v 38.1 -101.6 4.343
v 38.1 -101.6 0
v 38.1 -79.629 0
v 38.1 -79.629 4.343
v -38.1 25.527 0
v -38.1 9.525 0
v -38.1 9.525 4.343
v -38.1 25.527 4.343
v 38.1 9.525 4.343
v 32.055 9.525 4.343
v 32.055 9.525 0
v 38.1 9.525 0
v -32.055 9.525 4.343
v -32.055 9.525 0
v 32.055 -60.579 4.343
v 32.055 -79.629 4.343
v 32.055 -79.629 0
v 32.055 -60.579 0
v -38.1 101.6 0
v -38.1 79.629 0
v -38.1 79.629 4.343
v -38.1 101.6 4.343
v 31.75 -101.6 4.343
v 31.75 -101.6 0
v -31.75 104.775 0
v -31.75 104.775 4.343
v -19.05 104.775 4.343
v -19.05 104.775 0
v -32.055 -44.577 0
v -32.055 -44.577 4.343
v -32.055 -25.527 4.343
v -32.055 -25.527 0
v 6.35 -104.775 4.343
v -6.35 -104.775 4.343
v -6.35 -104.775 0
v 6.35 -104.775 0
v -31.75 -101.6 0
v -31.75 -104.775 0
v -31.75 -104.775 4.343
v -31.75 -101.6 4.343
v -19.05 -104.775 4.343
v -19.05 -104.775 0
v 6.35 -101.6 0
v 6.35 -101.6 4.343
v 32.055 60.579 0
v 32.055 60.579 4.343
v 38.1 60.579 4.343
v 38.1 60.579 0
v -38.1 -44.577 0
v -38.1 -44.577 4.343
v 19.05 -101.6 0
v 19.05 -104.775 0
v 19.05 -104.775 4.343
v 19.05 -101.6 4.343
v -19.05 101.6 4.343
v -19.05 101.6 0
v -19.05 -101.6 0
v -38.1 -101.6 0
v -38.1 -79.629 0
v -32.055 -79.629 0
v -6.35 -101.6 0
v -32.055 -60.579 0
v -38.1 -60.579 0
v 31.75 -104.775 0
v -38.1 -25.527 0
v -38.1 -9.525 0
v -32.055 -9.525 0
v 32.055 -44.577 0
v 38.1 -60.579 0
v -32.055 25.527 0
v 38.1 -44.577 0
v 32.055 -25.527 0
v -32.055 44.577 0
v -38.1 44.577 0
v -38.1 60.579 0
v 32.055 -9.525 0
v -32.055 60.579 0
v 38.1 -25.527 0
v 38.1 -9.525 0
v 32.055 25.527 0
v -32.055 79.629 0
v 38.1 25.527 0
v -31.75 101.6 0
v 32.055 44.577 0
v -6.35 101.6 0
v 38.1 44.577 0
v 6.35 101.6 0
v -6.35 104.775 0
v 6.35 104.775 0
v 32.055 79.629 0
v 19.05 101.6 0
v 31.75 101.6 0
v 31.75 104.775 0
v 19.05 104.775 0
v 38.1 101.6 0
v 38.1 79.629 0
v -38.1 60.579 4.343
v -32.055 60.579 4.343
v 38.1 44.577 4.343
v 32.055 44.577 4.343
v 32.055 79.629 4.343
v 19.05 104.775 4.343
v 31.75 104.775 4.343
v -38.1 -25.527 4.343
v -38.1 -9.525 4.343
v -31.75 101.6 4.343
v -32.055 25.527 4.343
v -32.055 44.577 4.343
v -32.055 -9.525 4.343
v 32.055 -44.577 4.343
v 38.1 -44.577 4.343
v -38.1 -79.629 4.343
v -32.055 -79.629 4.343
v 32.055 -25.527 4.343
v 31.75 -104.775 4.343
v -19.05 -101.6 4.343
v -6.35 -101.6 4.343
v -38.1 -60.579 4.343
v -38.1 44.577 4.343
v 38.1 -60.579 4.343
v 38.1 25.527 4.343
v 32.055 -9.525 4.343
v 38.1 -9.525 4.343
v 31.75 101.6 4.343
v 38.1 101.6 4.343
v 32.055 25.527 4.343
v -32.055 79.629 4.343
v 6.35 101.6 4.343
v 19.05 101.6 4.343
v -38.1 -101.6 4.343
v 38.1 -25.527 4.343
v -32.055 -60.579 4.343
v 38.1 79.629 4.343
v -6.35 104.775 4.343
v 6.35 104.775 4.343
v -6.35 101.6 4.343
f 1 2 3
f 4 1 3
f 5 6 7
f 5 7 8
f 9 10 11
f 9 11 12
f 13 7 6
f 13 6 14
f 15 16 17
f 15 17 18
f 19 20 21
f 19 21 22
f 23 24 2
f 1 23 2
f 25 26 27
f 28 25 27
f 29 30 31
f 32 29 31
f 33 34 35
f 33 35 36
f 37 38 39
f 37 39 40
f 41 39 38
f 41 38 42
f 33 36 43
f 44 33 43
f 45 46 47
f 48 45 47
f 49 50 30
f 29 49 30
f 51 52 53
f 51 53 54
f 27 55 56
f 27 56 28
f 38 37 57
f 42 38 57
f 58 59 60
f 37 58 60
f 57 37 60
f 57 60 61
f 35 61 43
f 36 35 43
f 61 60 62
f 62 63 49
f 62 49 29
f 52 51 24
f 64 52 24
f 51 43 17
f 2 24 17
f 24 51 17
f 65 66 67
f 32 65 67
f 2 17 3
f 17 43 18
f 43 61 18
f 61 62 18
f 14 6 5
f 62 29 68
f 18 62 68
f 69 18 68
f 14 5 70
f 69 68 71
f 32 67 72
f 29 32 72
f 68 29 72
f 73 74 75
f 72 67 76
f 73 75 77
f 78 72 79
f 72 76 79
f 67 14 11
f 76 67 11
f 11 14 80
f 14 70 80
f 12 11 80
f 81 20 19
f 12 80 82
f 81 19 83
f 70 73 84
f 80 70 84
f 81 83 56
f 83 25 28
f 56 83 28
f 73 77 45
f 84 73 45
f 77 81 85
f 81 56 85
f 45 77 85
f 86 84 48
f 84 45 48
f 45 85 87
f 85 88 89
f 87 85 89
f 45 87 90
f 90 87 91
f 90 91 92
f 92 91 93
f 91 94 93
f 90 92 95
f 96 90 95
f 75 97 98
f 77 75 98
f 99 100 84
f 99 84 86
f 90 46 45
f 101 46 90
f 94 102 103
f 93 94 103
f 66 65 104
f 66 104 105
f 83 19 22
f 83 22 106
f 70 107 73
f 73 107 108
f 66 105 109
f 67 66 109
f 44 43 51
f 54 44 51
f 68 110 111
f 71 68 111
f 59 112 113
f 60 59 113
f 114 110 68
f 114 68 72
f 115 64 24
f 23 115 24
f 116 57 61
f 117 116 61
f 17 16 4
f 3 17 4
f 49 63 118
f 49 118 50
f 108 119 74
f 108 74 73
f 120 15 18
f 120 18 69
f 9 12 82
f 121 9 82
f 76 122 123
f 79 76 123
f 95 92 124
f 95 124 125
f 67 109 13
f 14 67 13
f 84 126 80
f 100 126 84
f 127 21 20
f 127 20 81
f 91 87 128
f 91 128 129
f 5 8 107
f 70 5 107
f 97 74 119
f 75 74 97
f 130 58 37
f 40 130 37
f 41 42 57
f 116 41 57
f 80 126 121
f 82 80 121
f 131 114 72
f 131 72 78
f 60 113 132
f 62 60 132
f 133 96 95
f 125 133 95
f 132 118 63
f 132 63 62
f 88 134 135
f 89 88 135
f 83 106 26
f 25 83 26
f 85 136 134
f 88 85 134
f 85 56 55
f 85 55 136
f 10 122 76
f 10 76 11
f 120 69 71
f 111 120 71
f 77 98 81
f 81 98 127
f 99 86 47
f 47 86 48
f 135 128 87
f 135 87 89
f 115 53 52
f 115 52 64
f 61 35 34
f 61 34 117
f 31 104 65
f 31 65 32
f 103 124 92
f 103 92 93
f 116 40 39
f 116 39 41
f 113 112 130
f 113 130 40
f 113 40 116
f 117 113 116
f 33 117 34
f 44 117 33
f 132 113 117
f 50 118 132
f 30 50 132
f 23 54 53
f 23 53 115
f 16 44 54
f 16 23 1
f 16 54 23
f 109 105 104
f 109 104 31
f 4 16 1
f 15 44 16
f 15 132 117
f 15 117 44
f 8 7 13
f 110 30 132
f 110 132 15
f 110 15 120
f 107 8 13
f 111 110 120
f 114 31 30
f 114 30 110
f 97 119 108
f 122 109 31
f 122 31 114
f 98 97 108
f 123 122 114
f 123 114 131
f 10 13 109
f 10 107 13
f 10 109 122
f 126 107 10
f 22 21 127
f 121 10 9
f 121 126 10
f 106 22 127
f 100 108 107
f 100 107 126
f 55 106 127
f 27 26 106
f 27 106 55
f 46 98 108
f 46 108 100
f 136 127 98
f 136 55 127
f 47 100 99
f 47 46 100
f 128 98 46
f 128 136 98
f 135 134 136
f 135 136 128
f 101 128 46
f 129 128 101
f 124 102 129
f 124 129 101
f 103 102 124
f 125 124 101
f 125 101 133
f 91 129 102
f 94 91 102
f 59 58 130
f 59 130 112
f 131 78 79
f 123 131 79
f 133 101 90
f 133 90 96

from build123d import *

# Parameters (mm, degrees)
SKETCH1_W           = 76.2
SKETCH1_H           = 203.2
BOSS_EXTRUDE1_DEPTH = 4.3434
SKETCH2_W           = 12.7
SKETCH2_H           = 6.35
BOSS_EXTRUDE2_DEPTH = 4.3434
SKETCH3_W           = 12.0904
SKETCH3_H           = 19.05
CUT_EXTRUDE1_DEPTH  = 112.571841199


with BuildPart() as part:
    # Sketch1 → Boss-Extrude1 (new body)
    with BuildSketch(Plane.XY):
        Rectangle(SKETCH1_W, SKETCH1_H)
    extrude(amount=BOSS_EXTRUDE1_DEPTH)

    # Sketch2 → Boss-Extrude2 (add)
    with BuildSketch(Plane.XY.offset(4.3434)):
        with Locations((0, 101.6)):
            Rectangle(SKETCH2_W, SKETCH2_H)
        with Locations((-25.4, 101.6)):
            Rectangle(SKETCH2_W, SKETCH2_H)
        with Locations((25.4, 101.6)):
            Rectangle(SKETCH2_W, SKETCH2_H)
        with Locations((25.4, -101.6)):
            Rectangle(SKETCH2_W, SKETCH2_H)
        with Locations((-25.4, -101.6)):
            Rectangle(SKETCH2_W, SKETCH2_H)
        with Locations((0, -101.6)):
            Rectangle(SKETCH2_W, SKETCH2_H)
    extrude(amount=-BOSS_EXTRUDE2_DEPTH)

    # Sketch3 → Cut-Extrude1 (cut, through all)
    with BuildSketch(Plane.XY.offset(4.3434)):
        with Locations((38.1, 0)):
            Rectangle(SKETCH3_W, SKETCH3_H)
        with Locations((38.1, 35.052)):
            Rectangle(SKETCH3_W, SKETCH3_H)
        with Locations((38.1, 70.104)):
            Rectangle(SKETCH3_W, SKETCH3_H)
        with Locations((38.1, -70.104)):
            Rectangle(SKETCH3_W, SKETCH3_H)
        with Locations((38.1, -35.052)):
            Rectangle(SKETCH3_W, SKETCH3_H)
        with Locations((-38.1, -35.052)):
            Rectangle(SKETCH3_W, SKETCH3_H)
        with Locations((-38.1, -70.104)):
            Rectangle(SKETCH3_W, SKETCH3_H)
        with Locations((-38.1, 70.104)):
            Rectangle(SKETCH3_W, SKETCH3_H)
        with Locations((-38.1, 35.052)):
            Rectangle(SKETCH3_W, SKETCH3_H)
        with Locations((-38.1, 0)):
            Rectangle(SKETCH3_W, SKETCH3_H)
    extrude(amount=-CUT_EXTRUDE1_DEPTH, mode=Mode.SUBTRACT)


solid = part.part
